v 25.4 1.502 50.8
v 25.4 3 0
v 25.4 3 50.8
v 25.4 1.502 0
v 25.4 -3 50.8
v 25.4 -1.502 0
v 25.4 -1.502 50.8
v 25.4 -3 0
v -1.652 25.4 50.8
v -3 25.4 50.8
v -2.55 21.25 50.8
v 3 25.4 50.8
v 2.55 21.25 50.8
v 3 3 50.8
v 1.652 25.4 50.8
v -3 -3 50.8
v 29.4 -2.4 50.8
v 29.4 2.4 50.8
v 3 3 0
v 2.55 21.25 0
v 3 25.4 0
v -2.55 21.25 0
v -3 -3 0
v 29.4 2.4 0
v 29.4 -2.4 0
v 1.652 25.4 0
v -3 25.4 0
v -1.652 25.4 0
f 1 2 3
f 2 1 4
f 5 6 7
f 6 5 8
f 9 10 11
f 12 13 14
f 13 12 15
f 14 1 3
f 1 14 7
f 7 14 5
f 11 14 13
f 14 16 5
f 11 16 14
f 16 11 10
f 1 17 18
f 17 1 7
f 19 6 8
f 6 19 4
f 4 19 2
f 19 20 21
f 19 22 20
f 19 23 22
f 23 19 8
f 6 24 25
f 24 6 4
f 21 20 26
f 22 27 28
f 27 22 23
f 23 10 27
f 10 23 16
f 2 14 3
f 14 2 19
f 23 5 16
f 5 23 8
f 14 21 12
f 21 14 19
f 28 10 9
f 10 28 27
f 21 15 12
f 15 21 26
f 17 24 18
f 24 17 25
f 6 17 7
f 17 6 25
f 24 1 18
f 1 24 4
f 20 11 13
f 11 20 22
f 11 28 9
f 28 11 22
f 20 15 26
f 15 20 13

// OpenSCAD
// file: ../lib/pieces.scad
// pieces.scad — the core piece library (Phase 1).
// Requires grid.scad and connectors.scad to be included first.
//
// Grid convention: floors fill grid cells; walls run along grid lines,
// centered on them. Chains of gendered (tab) pieces alternate
// male-into-female; magnet/dowel/none pieces are genderless.

// Wall-end dovetail, sized to fit inside the wall thickness (absolute).
WALL_TAB_NECK  = 3;
WALL_TAB_HEAD  = 4.8;
WALL_TAB_DEPTH = 4;

// Structural thicknesses auto-grow when a magnet must fit in the edge.
function floor_t() = (CONNECTOR == "magnet")
    ? max(scaled(FLOOR_THICKNESS), magnet_d() + 2.4)
    : scaled(FLOOR_THICKNESS);
function wall_t() = (CONNECTOR == "magnet")
    ? max(scaled(WALL_THICKNESS), magnet_d() + 2.4)
    : scaled(WALL_THICKNESS);
function wall_h() = grid(WALL_HEIGHT_UNITS);

// ---------------------------------------------------------------------
// Floor tile: w x l grid cells, one connector centered per grid-square
// edge segment. Tab gender: male on +X and +Y edges, female on -X and
// -Y, so identically-oriented tiles tessellate in both directions.
module floor_tile(w = 1, l = 1) {
    t = floor_t();
    difference() {
        union() {
            cube([grid(w), grid(l), t]);
            if (CONNECTOR == "tab") {
                for (j = [0 : l - 1])
                    translate([grid(w), grid(j + 0.5), 0]) tab_male(t);
                for (i = [0 : w - 1])
                    translate([grid(i + 0.5), grid(l), 0])
                        rotate([0, 0, 90]) tab_male(t);
            }
        }
        if (CONNECTOR == "tab") {
            for (j = [0 : l - 1])
                translate([0, grid(j + 0.5), 0]) tab_female(t);
            for (i = [0 : w - 1])
                translate([grid(i + 0.5), 0, 0])
                    rotate([0, 0, 90]) tab_female(t);
        }
        if (CONNECTOR == "magnet" || CONNECTOR == "dowel") {
            for (j = [0 : l - 1]) {
                translate([0, grid(j + 0.5), 0]) edge_fastener(t / 2);
                translate([grid(w), grid(j + 0.5), 0])
                    mirror([1, 0, 0]) edge_fastener(t / 2);
            }
            for (i = [0 : w - 1]) {
                translate([grid(i + 0.5), 0, 0])
                    rotate([0, 0, 90]) edge_fastener(t / 2);
                translate([grid(i + 0.5), grid(l), 0])
                    mirror([0, 1, 0]) rotate([0, 0, 90])
                        edge_fastener(t / 2);
            }
        }
    }
}

// Magnet pocket or dowel hole, per the active CONNECTOR.
module edge_fastener(z) {
    if (CONNECTOR == "magnet") magnet_pocket(z);
    if (CONNECTOR == "dowel")  dowel_hole(z);
}

// ---------------------------------------------------------------------
// Straight wall: `units` grid squares long, centered on the grid line
// (y = 0). Tab gender: male at +X end, female at -X end; the tab runs
// the full height as a vertical sliding dovetail. Magnet/dowel: two
// fasteners per end face.
module wall_straight(units = 1) {
    h  = wall_h();
    wt = wall_t();
    difference() {
        union() {
            translate([0, -wt / 2, 0]) cube([grid(units), wt, h]);
            if (CONNECTOR == "tab")
                translate([grid(units), 0, 0])
                    tab_male(h, WALL_TAB_NECK, WALL_TAB_HEAD,
                             WALL_TAB_DEPTH);
        }
        if (CONNECTOR == "tab")
            tab_female(h, fit_clearance(), WALL_TAB_NECK, WALL_TAB_HEAD,
                       WALL_TAB_DEPTH);
        for (z = wall_fastener_heights()) {
            edge_fastener(z);
            translate([grid(units), 0, 0]) mirror([1, 0, 0])
                edge_fastener(z);
        }
    }
}

function wall_fastener_heights() =
    (CONNECTOR == "magnet" || CONNECTOR == "dowel")
        ? [grid(0.5), wall_h() - grid(0.5)] : [];

// ---------------------------------------------------------------------
// 90-degree corner: one arm along +X, one along +Y, each one grid
// square long, meeting at the grid-line crossing (origin). Tab gender:
// male at the +X arm end, female at the +Y arm end (opening outward),
// so a chain enters one arm and exits the other. Tab chains are
// chiral: set mirrored = true for the opposite-handed corner.
module wall_corner(mirrored = false) {
    h  = wall_h();
    wt = wall_t();
    mirror([mirrored ? 1 : 0, 0, 0])
        difference() {
            union() {
                translate([-wt / 2, -wt / 2, 0])
                    cube([grid(1) + wt / 2, wt, h]);
                translate([-wt / 2, -wt / 2, 0])
                    cube([wt, grid(1) + wt / 2, h]);
                if (CONNECTOR == "tab")
                    translate([grid(1), 0, 0])
                        tab_male(h, WALL_TAB_NECK, WALL_TAB_HEAD,
                                 WALL_TAB_DEPTH);
            }
            if (CONNECTOR == "tab")
                translate([0, grid(1), 0]) rotate([0, 0, -90])
                    tab_female(h, fit_clearance(), WALL_TAB_NECK,
                               WALL_TAB_HEAD, WALL_TAB_DEPTH);
            for (z = wall_fastener_heights()) {
                translate([grid(1), 0, 0]) mirror([1, 0, 0])
                    edge_fastener(z);
                translate([0, grid(1), 0]) mirror([0, 1, 0])
                    rotate([0, 0, 90]) edge_fastener(z);
            }
        }
}
// file: ../lib/connectors.scad
// connectors.scad — shared connector geometry.
// Requires grid.scad to be included first.
//
// Convention: a connector lives on an edge face lying in the YZ plane
// at x = 0, centered on y = 0, with the piece's material on the -X
// side for male parts and the +X side for female parts. Pieces
// translate/rotate these modules into position.
//
// All fit-critical dimensions here are ABSOLUTE (see grid.scad).

// Connector type used by all pieces: "tab" | "magnet" | "dowel" | "none".
// Tab & slot is gendered (a piece has male and female edges); magnet,
// dowel, and none are genderless, so tiles can be rotated freely.
CONNECTOR = "tab";

// Tab & slot (puzzle-style dovetail, full piece thickness). Defaults
// suit flat tiles; walls pass smaller dims that fit inside their
// thickness (see pieces.scad).
TAB_NECK  = 6;    // width at the edge face
TAB_HEAD  = 10;   // width at the tip
TAB_DEPTH = 6;    // how far the tab projects

// Dowel pin (1.75mm filament offcuts make free pins).
DOWEL_D     = 1.85;
DOWEL_DEPTH = 6;

// Magnet pocket. Named size "DxH" in mm.
MAGNET = "5x2";
function magnet_d(m = MAGNET) =
    m == "3x2" ? 3 : m == "6x2" ? 6 : m == "8x3" ? 8 : 5;
function magnet_h(m = MAGNET) =
    m == "8x3" ? 3 : 2;

// Dovetail profile, projecting toward +X. grow > 0 loosens the female.
module tab_profile(grow = 0, neck = TAB_NECK, head = TAB_HEAD,
                   depth = TAB_DEPTH) {
    polygon([
        [-EPS,         -(neck / 2 + grow)],
        [depth + grow, -(head / 2 + grow)],
        [depth + grow,   head / 2 + grow],
        [-EPS,           neck / 2 + grow]
    ]);
}

// Male tab: union onto a piece whose edge face is at x = 0, material
// on -X. The tab projects +X into the neighboring piece's slot.
module tab_male(thickness, neck = TAB_NECK, head = TAB_HEAD,
                depth = TAB_DEPTH) {
    linear_extrude(height = thickness)
        tab_profile(0, neck, head, depth);
}

// Female slot: subtract from a piece whose edge face is at x = 0,
// material on +X. The cut extends +X into the material, opening at the
// edge face so the mating tab enters from -X.
module tab_female(thickness, clearance = fit_clearance(),
                  neck = TAB_NECK, head = TAB_HEAD, depth = TAB_DEPTH) {
    translate([0, 0, -EPS])
        linear_extrude(height = thickness + 2 * EPS)
            tab_profile(clearance, neck, head, depth);
}

// Cylindrical pocket bored into an edge face at x = 0, material on +X,
// axis along +X, centered at height z.
module edge_pocket(d, depth, z) {
    translate([-EPS, 0, z])
        rotate([0, 90, 0])
            cylinder(h = depth + EPS, d = d);
}

// Magnet pocket (female on both mating pieces). Slight extra depth so
// the magnet seats flush after glue.
module magnet_pocket(z, m = MAGNET, clearance = fit_clearance()) {
    edge_pocket(magnet_d(m) + clearance, magnet_h(m) + 0.1, z);
}

// Dowel hole (female on both mating pieces).
module dowel_hole(z, clearance = fit_clearance()) {
    edge_pocket(DOWEL_D + clearance, DOWEL_DEPTH, z);
}
// file: ../lib/grid.scad
// grid.scad — core grid, scale, and tolerance foundation.
// Every piece in the system includes this file.
//
// Two classes of dimension, never mixed:
//   scaled()  — aesthetic sizes; follow SCALE so kits can be resized.
//   absolute  — fit-critical sizes (clearances, magnet pockets, pin
//               holes); constant regardless of SCALE.

// One tabletop grid square. 25.4mm (1 inch) keeps pieces in register
// with battlemats and standard 2-inch tile systems. Change once to
// retarget the whole library (e.g. 32 for a 32mm module standard).
GRID_UNIT = 25.4;

// Aesthetic scale multiplier (1.0 = 28mm heroic terrain).
SCALE = 1.0;

// Default structural sizes (scaled, mm at SCALE = 1.0).
FLOOR_THICKNESS   = 4;
WALL_THICKNESS    = 6;
WALL_HEIGHT_UNITS = 2;   // wall height in grid units

// Fit preset: "tight" | "normal" | "loose". Absolute mm — never scaled.
FIT = "normal";

function fit_clearance(fit = FIT) =
    fit == "tight" ? 0.10 :
    fit == "loose" ? 0.25 :
                     0.15;

// Helpers.
function scaled(x) = x * SCALE;
function grid(n)   = n * GRID_UNIT * SCALE;

// Boolean-overlap epsilon for clean CSG.
EPS = 0.01;

// Curve quality.
$fa = 4;
$fs = 0.4;
// main file
// wall_corner.scad — 90-degree corner wall.
// CORNER_MIRRORED selects handedness (tab chains are chiral).
include <../lib/grid.scad>
include <../lib/connectors.scad>
include <../lib/pieces.scad>

CORNER_MIRRORED = false;

wall_corner(CORNER_MIRRORED);
